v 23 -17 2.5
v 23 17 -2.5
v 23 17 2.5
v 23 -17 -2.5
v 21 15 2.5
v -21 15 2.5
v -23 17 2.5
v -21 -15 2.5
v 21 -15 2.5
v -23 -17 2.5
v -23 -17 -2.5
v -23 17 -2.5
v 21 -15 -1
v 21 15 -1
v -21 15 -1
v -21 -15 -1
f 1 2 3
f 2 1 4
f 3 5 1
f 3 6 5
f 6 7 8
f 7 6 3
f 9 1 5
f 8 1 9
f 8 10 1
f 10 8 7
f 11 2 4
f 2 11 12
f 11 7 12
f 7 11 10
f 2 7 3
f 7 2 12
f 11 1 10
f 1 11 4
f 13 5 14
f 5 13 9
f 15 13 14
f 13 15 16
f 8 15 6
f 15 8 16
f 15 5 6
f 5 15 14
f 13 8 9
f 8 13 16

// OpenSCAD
module display_module() {
    // Main display body
    difference() {
        // Outer frame
        cube([46, 34, 5], center=true);
        // Inner screen cutout
        translate([-21, -15, -1])
            cube([42, 30, 6], center=false);
    }
}

display_module();
